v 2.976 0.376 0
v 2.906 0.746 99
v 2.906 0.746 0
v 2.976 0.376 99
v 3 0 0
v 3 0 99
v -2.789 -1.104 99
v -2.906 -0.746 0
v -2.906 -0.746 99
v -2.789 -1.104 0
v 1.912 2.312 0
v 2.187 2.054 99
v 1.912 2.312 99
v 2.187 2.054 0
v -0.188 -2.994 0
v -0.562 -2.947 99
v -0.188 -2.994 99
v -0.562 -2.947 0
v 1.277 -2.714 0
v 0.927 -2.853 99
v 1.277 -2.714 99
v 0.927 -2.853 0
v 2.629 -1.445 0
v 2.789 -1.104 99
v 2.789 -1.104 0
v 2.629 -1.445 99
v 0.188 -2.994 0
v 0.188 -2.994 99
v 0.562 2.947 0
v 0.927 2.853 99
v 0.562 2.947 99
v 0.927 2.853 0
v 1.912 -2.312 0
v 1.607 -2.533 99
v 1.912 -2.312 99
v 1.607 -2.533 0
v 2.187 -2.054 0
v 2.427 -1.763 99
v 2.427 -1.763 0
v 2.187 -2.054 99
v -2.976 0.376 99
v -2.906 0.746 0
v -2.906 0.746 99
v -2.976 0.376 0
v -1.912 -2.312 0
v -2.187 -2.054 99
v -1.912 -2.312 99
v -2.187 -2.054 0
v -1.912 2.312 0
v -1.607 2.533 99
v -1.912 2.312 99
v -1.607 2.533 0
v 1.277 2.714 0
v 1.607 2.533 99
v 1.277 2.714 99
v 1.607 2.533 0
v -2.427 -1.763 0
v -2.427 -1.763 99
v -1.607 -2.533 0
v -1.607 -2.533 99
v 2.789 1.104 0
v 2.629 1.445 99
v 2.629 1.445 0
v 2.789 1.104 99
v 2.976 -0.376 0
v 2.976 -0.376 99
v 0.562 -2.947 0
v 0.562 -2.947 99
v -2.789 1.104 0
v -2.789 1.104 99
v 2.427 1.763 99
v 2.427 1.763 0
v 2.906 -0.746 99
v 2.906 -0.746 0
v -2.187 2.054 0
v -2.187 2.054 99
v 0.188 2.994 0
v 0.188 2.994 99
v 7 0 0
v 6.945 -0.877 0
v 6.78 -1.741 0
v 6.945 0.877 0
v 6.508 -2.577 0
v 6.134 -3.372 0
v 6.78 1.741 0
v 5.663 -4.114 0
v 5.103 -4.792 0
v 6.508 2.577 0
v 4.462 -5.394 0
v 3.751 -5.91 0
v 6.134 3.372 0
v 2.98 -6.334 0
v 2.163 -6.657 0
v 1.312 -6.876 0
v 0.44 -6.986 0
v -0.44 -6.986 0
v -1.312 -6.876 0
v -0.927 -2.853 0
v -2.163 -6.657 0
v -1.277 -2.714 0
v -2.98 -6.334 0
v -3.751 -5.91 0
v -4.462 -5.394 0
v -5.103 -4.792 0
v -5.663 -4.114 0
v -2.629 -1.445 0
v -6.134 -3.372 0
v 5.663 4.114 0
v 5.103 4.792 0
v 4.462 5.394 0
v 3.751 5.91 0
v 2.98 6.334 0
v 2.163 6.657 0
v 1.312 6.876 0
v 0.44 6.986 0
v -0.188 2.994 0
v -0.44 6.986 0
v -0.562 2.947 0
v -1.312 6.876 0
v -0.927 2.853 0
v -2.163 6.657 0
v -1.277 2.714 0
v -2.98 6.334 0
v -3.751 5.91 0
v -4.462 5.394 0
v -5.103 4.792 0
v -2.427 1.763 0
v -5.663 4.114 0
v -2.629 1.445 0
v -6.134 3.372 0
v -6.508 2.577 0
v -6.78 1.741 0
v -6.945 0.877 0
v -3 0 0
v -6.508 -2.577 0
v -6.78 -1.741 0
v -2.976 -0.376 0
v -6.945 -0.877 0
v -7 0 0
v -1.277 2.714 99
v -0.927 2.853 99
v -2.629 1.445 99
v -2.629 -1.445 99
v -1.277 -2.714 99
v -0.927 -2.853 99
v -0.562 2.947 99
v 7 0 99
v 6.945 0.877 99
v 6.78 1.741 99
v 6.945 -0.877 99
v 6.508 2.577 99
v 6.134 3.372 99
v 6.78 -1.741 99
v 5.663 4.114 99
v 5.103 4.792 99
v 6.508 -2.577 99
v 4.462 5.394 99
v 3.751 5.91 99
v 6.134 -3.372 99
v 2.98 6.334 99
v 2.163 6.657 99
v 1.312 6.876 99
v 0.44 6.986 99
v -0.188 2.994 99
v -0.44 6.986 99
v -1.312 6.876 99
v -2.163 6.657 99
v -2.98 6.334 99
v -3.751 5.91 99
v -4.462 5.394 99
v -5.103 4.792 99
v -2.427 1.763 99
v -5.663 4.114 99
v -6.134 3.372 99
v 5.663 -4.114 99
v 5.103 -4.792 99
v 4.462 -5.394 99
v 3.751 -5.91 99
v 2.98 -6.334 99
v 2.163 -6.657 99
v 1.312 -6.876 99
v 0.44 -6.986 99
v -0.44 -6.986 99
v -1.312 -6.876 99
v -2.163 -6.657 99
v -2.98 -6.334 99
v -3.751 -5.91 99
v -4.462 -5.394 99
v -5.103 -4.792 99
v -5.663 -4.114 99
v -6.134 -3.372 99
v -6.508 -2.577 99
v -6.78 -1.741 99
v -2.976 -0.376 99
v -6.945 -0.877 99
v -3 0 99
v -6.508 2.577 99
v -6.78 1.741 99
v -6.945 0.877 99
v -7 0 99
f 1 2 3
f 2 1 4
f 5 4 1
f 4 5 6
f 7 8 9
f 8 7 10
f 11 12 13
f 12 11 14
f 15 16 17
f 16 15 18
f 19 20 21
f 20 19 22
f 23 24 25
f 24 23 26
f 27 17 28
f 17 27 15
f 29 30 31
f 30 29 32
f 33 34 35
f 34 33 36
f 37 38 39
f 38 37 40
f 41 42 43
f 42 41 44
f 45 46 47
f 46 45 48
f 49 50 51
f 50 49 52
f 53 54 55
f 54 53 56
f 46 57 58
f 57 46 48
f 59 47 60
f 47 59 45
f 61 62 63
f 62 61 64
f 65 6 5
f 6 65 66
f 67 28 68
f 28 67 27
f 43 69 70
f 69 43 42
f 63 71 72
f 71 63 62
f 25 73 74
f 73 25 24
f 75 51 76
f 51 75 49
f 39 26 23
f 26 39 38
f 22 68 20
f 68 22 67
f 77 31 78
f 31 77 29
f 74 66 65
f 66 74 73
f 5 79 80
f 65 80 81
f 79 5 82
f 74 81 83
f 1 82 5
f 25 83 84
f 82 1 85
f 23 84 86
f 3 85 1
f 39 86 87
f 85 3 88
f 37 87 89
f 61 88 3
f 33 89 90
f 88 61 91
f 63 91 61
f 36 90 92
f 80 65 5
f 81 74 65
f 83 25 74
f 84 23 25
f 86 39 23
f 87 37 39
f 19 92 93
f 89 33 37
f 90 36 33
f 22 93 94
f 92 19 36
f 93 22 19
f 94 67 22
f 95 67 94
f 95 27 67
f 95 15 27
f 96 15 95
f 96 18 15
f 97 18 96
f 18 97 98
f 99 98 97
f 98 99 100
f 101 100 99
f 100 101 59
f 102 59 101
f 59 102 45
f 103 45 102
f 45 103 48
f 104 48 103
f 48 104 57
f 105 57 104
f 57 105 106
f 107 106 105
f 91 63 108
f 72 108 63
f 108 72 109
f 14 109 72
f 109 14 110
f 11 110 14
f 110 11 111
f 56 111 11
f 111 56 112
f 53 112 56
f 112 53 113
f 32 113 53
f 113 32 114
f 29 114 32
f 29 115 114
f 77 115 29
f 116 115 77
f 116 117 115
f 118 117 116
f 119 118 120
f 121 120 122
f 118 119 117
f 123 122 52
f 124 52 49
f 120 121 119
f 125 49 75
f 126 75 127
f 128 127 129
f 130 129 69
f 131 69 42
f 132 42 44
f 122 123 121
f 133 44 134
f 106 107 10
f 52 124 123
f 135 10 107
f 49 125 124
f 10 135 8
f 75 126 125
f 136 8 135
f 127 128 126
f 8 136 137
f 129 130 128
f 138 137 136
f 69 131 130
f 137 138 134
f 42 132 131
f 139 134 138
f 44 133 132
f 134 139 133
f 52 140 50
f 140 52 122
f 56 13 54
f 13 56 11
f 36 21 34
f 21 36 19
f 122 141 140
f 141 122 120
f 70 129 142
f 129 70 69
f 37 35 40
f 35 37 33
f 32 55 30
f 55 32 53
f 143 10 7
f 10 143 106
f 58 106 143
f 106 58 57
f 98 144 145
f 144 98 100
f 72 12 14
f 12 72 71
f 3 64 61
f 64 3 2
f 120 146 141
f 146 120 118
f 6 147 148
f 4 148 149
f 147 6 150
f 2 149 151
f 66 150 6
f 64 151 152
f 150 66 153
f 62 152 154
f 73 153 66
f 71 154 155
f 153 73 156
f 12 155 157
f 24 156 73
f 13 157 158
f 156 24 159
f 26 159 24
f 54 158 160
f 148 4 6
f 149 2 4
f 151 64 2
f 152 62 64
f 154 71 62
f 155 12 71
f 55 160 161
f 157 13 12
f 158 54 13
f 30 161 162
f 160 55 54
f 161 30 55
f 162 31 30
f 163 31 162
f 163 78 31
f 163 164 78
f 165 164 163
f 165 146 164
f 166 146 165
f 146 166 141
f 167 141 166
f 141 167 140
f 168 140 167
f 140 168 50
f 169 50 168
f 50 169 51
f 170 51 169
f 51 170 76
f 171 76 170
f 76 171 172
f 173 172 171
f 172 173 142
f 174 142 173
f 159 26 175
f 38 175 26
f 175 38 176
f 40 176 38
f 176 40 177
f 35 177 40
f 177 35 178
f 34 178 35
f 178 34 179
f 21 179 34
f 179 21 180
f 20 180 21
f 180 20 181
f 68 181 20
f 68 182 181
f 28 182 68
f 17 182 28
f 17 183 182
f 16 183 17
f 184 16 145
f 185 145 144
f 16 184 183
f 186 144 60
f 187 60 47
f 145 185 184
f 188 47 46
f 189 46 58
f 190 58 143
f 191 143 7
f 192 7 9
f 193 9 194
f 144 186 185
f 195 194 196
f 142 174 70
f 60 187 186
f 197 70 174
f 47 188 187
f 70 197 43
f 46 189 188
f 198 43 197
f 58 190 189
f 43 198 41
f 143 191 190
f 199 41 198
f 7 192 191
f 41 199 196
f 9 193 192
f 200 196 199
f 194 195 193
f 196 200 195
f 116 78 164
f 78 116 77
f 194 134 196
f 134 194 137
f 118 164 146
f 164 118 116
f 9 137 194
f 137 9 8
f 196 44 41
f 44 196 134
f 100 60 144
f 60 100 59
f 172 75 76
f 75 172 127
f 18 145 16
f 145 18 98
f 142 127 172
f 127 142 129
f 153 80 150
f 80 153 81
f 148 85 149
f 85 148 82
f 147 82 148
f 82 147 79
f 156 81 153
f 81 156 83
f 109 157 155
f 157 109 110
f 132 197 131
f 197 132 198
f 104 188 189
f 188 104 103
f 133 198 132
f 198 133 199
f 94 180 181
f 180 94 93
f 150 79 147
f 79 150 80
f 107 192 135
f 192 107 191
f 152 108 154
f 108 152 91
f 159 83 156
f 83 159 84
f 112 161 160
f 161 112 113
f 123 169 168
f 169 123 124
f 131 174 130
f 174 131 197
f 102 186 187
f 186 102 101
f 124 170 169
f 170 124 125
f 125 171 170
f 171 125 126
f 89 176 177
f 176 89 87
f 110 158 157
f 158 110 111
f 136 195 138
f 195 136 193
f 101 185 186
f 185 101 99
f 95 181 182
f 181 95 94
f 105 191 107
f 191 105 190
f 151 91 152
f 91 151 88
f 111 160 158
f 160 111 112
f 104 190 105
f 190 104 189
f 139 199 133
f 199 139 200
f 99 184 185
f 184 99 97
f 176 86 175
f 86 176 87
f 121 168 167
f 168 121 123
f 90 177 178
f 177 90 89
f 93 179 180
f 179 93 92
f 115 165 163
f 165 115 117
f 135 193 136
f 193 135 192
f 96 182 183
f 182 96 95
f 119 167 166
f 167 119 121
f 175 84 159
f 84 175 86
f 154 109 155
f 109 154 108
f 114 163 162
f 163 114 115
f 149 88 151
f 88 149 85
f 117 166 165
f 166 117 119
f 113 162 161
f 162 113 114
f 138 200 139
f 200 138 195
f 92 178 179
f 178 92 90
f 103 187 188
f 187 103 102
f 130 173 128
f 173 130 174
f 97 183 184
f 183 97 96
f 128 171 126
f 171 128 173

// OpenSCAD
$fn = 50;


difference() {
	union() {
		cylinder(h = 99, r = 7.0000000000);
	}
	union() {
		cylinder(h = 99, r = 3.0000000000);
		cylinder(h = 99, r = 1.5000000000);
		cylinder(h = 99, r = 1.5000000000);
		cylinder(h = 99, r = 1.5000000000);
	}
}
